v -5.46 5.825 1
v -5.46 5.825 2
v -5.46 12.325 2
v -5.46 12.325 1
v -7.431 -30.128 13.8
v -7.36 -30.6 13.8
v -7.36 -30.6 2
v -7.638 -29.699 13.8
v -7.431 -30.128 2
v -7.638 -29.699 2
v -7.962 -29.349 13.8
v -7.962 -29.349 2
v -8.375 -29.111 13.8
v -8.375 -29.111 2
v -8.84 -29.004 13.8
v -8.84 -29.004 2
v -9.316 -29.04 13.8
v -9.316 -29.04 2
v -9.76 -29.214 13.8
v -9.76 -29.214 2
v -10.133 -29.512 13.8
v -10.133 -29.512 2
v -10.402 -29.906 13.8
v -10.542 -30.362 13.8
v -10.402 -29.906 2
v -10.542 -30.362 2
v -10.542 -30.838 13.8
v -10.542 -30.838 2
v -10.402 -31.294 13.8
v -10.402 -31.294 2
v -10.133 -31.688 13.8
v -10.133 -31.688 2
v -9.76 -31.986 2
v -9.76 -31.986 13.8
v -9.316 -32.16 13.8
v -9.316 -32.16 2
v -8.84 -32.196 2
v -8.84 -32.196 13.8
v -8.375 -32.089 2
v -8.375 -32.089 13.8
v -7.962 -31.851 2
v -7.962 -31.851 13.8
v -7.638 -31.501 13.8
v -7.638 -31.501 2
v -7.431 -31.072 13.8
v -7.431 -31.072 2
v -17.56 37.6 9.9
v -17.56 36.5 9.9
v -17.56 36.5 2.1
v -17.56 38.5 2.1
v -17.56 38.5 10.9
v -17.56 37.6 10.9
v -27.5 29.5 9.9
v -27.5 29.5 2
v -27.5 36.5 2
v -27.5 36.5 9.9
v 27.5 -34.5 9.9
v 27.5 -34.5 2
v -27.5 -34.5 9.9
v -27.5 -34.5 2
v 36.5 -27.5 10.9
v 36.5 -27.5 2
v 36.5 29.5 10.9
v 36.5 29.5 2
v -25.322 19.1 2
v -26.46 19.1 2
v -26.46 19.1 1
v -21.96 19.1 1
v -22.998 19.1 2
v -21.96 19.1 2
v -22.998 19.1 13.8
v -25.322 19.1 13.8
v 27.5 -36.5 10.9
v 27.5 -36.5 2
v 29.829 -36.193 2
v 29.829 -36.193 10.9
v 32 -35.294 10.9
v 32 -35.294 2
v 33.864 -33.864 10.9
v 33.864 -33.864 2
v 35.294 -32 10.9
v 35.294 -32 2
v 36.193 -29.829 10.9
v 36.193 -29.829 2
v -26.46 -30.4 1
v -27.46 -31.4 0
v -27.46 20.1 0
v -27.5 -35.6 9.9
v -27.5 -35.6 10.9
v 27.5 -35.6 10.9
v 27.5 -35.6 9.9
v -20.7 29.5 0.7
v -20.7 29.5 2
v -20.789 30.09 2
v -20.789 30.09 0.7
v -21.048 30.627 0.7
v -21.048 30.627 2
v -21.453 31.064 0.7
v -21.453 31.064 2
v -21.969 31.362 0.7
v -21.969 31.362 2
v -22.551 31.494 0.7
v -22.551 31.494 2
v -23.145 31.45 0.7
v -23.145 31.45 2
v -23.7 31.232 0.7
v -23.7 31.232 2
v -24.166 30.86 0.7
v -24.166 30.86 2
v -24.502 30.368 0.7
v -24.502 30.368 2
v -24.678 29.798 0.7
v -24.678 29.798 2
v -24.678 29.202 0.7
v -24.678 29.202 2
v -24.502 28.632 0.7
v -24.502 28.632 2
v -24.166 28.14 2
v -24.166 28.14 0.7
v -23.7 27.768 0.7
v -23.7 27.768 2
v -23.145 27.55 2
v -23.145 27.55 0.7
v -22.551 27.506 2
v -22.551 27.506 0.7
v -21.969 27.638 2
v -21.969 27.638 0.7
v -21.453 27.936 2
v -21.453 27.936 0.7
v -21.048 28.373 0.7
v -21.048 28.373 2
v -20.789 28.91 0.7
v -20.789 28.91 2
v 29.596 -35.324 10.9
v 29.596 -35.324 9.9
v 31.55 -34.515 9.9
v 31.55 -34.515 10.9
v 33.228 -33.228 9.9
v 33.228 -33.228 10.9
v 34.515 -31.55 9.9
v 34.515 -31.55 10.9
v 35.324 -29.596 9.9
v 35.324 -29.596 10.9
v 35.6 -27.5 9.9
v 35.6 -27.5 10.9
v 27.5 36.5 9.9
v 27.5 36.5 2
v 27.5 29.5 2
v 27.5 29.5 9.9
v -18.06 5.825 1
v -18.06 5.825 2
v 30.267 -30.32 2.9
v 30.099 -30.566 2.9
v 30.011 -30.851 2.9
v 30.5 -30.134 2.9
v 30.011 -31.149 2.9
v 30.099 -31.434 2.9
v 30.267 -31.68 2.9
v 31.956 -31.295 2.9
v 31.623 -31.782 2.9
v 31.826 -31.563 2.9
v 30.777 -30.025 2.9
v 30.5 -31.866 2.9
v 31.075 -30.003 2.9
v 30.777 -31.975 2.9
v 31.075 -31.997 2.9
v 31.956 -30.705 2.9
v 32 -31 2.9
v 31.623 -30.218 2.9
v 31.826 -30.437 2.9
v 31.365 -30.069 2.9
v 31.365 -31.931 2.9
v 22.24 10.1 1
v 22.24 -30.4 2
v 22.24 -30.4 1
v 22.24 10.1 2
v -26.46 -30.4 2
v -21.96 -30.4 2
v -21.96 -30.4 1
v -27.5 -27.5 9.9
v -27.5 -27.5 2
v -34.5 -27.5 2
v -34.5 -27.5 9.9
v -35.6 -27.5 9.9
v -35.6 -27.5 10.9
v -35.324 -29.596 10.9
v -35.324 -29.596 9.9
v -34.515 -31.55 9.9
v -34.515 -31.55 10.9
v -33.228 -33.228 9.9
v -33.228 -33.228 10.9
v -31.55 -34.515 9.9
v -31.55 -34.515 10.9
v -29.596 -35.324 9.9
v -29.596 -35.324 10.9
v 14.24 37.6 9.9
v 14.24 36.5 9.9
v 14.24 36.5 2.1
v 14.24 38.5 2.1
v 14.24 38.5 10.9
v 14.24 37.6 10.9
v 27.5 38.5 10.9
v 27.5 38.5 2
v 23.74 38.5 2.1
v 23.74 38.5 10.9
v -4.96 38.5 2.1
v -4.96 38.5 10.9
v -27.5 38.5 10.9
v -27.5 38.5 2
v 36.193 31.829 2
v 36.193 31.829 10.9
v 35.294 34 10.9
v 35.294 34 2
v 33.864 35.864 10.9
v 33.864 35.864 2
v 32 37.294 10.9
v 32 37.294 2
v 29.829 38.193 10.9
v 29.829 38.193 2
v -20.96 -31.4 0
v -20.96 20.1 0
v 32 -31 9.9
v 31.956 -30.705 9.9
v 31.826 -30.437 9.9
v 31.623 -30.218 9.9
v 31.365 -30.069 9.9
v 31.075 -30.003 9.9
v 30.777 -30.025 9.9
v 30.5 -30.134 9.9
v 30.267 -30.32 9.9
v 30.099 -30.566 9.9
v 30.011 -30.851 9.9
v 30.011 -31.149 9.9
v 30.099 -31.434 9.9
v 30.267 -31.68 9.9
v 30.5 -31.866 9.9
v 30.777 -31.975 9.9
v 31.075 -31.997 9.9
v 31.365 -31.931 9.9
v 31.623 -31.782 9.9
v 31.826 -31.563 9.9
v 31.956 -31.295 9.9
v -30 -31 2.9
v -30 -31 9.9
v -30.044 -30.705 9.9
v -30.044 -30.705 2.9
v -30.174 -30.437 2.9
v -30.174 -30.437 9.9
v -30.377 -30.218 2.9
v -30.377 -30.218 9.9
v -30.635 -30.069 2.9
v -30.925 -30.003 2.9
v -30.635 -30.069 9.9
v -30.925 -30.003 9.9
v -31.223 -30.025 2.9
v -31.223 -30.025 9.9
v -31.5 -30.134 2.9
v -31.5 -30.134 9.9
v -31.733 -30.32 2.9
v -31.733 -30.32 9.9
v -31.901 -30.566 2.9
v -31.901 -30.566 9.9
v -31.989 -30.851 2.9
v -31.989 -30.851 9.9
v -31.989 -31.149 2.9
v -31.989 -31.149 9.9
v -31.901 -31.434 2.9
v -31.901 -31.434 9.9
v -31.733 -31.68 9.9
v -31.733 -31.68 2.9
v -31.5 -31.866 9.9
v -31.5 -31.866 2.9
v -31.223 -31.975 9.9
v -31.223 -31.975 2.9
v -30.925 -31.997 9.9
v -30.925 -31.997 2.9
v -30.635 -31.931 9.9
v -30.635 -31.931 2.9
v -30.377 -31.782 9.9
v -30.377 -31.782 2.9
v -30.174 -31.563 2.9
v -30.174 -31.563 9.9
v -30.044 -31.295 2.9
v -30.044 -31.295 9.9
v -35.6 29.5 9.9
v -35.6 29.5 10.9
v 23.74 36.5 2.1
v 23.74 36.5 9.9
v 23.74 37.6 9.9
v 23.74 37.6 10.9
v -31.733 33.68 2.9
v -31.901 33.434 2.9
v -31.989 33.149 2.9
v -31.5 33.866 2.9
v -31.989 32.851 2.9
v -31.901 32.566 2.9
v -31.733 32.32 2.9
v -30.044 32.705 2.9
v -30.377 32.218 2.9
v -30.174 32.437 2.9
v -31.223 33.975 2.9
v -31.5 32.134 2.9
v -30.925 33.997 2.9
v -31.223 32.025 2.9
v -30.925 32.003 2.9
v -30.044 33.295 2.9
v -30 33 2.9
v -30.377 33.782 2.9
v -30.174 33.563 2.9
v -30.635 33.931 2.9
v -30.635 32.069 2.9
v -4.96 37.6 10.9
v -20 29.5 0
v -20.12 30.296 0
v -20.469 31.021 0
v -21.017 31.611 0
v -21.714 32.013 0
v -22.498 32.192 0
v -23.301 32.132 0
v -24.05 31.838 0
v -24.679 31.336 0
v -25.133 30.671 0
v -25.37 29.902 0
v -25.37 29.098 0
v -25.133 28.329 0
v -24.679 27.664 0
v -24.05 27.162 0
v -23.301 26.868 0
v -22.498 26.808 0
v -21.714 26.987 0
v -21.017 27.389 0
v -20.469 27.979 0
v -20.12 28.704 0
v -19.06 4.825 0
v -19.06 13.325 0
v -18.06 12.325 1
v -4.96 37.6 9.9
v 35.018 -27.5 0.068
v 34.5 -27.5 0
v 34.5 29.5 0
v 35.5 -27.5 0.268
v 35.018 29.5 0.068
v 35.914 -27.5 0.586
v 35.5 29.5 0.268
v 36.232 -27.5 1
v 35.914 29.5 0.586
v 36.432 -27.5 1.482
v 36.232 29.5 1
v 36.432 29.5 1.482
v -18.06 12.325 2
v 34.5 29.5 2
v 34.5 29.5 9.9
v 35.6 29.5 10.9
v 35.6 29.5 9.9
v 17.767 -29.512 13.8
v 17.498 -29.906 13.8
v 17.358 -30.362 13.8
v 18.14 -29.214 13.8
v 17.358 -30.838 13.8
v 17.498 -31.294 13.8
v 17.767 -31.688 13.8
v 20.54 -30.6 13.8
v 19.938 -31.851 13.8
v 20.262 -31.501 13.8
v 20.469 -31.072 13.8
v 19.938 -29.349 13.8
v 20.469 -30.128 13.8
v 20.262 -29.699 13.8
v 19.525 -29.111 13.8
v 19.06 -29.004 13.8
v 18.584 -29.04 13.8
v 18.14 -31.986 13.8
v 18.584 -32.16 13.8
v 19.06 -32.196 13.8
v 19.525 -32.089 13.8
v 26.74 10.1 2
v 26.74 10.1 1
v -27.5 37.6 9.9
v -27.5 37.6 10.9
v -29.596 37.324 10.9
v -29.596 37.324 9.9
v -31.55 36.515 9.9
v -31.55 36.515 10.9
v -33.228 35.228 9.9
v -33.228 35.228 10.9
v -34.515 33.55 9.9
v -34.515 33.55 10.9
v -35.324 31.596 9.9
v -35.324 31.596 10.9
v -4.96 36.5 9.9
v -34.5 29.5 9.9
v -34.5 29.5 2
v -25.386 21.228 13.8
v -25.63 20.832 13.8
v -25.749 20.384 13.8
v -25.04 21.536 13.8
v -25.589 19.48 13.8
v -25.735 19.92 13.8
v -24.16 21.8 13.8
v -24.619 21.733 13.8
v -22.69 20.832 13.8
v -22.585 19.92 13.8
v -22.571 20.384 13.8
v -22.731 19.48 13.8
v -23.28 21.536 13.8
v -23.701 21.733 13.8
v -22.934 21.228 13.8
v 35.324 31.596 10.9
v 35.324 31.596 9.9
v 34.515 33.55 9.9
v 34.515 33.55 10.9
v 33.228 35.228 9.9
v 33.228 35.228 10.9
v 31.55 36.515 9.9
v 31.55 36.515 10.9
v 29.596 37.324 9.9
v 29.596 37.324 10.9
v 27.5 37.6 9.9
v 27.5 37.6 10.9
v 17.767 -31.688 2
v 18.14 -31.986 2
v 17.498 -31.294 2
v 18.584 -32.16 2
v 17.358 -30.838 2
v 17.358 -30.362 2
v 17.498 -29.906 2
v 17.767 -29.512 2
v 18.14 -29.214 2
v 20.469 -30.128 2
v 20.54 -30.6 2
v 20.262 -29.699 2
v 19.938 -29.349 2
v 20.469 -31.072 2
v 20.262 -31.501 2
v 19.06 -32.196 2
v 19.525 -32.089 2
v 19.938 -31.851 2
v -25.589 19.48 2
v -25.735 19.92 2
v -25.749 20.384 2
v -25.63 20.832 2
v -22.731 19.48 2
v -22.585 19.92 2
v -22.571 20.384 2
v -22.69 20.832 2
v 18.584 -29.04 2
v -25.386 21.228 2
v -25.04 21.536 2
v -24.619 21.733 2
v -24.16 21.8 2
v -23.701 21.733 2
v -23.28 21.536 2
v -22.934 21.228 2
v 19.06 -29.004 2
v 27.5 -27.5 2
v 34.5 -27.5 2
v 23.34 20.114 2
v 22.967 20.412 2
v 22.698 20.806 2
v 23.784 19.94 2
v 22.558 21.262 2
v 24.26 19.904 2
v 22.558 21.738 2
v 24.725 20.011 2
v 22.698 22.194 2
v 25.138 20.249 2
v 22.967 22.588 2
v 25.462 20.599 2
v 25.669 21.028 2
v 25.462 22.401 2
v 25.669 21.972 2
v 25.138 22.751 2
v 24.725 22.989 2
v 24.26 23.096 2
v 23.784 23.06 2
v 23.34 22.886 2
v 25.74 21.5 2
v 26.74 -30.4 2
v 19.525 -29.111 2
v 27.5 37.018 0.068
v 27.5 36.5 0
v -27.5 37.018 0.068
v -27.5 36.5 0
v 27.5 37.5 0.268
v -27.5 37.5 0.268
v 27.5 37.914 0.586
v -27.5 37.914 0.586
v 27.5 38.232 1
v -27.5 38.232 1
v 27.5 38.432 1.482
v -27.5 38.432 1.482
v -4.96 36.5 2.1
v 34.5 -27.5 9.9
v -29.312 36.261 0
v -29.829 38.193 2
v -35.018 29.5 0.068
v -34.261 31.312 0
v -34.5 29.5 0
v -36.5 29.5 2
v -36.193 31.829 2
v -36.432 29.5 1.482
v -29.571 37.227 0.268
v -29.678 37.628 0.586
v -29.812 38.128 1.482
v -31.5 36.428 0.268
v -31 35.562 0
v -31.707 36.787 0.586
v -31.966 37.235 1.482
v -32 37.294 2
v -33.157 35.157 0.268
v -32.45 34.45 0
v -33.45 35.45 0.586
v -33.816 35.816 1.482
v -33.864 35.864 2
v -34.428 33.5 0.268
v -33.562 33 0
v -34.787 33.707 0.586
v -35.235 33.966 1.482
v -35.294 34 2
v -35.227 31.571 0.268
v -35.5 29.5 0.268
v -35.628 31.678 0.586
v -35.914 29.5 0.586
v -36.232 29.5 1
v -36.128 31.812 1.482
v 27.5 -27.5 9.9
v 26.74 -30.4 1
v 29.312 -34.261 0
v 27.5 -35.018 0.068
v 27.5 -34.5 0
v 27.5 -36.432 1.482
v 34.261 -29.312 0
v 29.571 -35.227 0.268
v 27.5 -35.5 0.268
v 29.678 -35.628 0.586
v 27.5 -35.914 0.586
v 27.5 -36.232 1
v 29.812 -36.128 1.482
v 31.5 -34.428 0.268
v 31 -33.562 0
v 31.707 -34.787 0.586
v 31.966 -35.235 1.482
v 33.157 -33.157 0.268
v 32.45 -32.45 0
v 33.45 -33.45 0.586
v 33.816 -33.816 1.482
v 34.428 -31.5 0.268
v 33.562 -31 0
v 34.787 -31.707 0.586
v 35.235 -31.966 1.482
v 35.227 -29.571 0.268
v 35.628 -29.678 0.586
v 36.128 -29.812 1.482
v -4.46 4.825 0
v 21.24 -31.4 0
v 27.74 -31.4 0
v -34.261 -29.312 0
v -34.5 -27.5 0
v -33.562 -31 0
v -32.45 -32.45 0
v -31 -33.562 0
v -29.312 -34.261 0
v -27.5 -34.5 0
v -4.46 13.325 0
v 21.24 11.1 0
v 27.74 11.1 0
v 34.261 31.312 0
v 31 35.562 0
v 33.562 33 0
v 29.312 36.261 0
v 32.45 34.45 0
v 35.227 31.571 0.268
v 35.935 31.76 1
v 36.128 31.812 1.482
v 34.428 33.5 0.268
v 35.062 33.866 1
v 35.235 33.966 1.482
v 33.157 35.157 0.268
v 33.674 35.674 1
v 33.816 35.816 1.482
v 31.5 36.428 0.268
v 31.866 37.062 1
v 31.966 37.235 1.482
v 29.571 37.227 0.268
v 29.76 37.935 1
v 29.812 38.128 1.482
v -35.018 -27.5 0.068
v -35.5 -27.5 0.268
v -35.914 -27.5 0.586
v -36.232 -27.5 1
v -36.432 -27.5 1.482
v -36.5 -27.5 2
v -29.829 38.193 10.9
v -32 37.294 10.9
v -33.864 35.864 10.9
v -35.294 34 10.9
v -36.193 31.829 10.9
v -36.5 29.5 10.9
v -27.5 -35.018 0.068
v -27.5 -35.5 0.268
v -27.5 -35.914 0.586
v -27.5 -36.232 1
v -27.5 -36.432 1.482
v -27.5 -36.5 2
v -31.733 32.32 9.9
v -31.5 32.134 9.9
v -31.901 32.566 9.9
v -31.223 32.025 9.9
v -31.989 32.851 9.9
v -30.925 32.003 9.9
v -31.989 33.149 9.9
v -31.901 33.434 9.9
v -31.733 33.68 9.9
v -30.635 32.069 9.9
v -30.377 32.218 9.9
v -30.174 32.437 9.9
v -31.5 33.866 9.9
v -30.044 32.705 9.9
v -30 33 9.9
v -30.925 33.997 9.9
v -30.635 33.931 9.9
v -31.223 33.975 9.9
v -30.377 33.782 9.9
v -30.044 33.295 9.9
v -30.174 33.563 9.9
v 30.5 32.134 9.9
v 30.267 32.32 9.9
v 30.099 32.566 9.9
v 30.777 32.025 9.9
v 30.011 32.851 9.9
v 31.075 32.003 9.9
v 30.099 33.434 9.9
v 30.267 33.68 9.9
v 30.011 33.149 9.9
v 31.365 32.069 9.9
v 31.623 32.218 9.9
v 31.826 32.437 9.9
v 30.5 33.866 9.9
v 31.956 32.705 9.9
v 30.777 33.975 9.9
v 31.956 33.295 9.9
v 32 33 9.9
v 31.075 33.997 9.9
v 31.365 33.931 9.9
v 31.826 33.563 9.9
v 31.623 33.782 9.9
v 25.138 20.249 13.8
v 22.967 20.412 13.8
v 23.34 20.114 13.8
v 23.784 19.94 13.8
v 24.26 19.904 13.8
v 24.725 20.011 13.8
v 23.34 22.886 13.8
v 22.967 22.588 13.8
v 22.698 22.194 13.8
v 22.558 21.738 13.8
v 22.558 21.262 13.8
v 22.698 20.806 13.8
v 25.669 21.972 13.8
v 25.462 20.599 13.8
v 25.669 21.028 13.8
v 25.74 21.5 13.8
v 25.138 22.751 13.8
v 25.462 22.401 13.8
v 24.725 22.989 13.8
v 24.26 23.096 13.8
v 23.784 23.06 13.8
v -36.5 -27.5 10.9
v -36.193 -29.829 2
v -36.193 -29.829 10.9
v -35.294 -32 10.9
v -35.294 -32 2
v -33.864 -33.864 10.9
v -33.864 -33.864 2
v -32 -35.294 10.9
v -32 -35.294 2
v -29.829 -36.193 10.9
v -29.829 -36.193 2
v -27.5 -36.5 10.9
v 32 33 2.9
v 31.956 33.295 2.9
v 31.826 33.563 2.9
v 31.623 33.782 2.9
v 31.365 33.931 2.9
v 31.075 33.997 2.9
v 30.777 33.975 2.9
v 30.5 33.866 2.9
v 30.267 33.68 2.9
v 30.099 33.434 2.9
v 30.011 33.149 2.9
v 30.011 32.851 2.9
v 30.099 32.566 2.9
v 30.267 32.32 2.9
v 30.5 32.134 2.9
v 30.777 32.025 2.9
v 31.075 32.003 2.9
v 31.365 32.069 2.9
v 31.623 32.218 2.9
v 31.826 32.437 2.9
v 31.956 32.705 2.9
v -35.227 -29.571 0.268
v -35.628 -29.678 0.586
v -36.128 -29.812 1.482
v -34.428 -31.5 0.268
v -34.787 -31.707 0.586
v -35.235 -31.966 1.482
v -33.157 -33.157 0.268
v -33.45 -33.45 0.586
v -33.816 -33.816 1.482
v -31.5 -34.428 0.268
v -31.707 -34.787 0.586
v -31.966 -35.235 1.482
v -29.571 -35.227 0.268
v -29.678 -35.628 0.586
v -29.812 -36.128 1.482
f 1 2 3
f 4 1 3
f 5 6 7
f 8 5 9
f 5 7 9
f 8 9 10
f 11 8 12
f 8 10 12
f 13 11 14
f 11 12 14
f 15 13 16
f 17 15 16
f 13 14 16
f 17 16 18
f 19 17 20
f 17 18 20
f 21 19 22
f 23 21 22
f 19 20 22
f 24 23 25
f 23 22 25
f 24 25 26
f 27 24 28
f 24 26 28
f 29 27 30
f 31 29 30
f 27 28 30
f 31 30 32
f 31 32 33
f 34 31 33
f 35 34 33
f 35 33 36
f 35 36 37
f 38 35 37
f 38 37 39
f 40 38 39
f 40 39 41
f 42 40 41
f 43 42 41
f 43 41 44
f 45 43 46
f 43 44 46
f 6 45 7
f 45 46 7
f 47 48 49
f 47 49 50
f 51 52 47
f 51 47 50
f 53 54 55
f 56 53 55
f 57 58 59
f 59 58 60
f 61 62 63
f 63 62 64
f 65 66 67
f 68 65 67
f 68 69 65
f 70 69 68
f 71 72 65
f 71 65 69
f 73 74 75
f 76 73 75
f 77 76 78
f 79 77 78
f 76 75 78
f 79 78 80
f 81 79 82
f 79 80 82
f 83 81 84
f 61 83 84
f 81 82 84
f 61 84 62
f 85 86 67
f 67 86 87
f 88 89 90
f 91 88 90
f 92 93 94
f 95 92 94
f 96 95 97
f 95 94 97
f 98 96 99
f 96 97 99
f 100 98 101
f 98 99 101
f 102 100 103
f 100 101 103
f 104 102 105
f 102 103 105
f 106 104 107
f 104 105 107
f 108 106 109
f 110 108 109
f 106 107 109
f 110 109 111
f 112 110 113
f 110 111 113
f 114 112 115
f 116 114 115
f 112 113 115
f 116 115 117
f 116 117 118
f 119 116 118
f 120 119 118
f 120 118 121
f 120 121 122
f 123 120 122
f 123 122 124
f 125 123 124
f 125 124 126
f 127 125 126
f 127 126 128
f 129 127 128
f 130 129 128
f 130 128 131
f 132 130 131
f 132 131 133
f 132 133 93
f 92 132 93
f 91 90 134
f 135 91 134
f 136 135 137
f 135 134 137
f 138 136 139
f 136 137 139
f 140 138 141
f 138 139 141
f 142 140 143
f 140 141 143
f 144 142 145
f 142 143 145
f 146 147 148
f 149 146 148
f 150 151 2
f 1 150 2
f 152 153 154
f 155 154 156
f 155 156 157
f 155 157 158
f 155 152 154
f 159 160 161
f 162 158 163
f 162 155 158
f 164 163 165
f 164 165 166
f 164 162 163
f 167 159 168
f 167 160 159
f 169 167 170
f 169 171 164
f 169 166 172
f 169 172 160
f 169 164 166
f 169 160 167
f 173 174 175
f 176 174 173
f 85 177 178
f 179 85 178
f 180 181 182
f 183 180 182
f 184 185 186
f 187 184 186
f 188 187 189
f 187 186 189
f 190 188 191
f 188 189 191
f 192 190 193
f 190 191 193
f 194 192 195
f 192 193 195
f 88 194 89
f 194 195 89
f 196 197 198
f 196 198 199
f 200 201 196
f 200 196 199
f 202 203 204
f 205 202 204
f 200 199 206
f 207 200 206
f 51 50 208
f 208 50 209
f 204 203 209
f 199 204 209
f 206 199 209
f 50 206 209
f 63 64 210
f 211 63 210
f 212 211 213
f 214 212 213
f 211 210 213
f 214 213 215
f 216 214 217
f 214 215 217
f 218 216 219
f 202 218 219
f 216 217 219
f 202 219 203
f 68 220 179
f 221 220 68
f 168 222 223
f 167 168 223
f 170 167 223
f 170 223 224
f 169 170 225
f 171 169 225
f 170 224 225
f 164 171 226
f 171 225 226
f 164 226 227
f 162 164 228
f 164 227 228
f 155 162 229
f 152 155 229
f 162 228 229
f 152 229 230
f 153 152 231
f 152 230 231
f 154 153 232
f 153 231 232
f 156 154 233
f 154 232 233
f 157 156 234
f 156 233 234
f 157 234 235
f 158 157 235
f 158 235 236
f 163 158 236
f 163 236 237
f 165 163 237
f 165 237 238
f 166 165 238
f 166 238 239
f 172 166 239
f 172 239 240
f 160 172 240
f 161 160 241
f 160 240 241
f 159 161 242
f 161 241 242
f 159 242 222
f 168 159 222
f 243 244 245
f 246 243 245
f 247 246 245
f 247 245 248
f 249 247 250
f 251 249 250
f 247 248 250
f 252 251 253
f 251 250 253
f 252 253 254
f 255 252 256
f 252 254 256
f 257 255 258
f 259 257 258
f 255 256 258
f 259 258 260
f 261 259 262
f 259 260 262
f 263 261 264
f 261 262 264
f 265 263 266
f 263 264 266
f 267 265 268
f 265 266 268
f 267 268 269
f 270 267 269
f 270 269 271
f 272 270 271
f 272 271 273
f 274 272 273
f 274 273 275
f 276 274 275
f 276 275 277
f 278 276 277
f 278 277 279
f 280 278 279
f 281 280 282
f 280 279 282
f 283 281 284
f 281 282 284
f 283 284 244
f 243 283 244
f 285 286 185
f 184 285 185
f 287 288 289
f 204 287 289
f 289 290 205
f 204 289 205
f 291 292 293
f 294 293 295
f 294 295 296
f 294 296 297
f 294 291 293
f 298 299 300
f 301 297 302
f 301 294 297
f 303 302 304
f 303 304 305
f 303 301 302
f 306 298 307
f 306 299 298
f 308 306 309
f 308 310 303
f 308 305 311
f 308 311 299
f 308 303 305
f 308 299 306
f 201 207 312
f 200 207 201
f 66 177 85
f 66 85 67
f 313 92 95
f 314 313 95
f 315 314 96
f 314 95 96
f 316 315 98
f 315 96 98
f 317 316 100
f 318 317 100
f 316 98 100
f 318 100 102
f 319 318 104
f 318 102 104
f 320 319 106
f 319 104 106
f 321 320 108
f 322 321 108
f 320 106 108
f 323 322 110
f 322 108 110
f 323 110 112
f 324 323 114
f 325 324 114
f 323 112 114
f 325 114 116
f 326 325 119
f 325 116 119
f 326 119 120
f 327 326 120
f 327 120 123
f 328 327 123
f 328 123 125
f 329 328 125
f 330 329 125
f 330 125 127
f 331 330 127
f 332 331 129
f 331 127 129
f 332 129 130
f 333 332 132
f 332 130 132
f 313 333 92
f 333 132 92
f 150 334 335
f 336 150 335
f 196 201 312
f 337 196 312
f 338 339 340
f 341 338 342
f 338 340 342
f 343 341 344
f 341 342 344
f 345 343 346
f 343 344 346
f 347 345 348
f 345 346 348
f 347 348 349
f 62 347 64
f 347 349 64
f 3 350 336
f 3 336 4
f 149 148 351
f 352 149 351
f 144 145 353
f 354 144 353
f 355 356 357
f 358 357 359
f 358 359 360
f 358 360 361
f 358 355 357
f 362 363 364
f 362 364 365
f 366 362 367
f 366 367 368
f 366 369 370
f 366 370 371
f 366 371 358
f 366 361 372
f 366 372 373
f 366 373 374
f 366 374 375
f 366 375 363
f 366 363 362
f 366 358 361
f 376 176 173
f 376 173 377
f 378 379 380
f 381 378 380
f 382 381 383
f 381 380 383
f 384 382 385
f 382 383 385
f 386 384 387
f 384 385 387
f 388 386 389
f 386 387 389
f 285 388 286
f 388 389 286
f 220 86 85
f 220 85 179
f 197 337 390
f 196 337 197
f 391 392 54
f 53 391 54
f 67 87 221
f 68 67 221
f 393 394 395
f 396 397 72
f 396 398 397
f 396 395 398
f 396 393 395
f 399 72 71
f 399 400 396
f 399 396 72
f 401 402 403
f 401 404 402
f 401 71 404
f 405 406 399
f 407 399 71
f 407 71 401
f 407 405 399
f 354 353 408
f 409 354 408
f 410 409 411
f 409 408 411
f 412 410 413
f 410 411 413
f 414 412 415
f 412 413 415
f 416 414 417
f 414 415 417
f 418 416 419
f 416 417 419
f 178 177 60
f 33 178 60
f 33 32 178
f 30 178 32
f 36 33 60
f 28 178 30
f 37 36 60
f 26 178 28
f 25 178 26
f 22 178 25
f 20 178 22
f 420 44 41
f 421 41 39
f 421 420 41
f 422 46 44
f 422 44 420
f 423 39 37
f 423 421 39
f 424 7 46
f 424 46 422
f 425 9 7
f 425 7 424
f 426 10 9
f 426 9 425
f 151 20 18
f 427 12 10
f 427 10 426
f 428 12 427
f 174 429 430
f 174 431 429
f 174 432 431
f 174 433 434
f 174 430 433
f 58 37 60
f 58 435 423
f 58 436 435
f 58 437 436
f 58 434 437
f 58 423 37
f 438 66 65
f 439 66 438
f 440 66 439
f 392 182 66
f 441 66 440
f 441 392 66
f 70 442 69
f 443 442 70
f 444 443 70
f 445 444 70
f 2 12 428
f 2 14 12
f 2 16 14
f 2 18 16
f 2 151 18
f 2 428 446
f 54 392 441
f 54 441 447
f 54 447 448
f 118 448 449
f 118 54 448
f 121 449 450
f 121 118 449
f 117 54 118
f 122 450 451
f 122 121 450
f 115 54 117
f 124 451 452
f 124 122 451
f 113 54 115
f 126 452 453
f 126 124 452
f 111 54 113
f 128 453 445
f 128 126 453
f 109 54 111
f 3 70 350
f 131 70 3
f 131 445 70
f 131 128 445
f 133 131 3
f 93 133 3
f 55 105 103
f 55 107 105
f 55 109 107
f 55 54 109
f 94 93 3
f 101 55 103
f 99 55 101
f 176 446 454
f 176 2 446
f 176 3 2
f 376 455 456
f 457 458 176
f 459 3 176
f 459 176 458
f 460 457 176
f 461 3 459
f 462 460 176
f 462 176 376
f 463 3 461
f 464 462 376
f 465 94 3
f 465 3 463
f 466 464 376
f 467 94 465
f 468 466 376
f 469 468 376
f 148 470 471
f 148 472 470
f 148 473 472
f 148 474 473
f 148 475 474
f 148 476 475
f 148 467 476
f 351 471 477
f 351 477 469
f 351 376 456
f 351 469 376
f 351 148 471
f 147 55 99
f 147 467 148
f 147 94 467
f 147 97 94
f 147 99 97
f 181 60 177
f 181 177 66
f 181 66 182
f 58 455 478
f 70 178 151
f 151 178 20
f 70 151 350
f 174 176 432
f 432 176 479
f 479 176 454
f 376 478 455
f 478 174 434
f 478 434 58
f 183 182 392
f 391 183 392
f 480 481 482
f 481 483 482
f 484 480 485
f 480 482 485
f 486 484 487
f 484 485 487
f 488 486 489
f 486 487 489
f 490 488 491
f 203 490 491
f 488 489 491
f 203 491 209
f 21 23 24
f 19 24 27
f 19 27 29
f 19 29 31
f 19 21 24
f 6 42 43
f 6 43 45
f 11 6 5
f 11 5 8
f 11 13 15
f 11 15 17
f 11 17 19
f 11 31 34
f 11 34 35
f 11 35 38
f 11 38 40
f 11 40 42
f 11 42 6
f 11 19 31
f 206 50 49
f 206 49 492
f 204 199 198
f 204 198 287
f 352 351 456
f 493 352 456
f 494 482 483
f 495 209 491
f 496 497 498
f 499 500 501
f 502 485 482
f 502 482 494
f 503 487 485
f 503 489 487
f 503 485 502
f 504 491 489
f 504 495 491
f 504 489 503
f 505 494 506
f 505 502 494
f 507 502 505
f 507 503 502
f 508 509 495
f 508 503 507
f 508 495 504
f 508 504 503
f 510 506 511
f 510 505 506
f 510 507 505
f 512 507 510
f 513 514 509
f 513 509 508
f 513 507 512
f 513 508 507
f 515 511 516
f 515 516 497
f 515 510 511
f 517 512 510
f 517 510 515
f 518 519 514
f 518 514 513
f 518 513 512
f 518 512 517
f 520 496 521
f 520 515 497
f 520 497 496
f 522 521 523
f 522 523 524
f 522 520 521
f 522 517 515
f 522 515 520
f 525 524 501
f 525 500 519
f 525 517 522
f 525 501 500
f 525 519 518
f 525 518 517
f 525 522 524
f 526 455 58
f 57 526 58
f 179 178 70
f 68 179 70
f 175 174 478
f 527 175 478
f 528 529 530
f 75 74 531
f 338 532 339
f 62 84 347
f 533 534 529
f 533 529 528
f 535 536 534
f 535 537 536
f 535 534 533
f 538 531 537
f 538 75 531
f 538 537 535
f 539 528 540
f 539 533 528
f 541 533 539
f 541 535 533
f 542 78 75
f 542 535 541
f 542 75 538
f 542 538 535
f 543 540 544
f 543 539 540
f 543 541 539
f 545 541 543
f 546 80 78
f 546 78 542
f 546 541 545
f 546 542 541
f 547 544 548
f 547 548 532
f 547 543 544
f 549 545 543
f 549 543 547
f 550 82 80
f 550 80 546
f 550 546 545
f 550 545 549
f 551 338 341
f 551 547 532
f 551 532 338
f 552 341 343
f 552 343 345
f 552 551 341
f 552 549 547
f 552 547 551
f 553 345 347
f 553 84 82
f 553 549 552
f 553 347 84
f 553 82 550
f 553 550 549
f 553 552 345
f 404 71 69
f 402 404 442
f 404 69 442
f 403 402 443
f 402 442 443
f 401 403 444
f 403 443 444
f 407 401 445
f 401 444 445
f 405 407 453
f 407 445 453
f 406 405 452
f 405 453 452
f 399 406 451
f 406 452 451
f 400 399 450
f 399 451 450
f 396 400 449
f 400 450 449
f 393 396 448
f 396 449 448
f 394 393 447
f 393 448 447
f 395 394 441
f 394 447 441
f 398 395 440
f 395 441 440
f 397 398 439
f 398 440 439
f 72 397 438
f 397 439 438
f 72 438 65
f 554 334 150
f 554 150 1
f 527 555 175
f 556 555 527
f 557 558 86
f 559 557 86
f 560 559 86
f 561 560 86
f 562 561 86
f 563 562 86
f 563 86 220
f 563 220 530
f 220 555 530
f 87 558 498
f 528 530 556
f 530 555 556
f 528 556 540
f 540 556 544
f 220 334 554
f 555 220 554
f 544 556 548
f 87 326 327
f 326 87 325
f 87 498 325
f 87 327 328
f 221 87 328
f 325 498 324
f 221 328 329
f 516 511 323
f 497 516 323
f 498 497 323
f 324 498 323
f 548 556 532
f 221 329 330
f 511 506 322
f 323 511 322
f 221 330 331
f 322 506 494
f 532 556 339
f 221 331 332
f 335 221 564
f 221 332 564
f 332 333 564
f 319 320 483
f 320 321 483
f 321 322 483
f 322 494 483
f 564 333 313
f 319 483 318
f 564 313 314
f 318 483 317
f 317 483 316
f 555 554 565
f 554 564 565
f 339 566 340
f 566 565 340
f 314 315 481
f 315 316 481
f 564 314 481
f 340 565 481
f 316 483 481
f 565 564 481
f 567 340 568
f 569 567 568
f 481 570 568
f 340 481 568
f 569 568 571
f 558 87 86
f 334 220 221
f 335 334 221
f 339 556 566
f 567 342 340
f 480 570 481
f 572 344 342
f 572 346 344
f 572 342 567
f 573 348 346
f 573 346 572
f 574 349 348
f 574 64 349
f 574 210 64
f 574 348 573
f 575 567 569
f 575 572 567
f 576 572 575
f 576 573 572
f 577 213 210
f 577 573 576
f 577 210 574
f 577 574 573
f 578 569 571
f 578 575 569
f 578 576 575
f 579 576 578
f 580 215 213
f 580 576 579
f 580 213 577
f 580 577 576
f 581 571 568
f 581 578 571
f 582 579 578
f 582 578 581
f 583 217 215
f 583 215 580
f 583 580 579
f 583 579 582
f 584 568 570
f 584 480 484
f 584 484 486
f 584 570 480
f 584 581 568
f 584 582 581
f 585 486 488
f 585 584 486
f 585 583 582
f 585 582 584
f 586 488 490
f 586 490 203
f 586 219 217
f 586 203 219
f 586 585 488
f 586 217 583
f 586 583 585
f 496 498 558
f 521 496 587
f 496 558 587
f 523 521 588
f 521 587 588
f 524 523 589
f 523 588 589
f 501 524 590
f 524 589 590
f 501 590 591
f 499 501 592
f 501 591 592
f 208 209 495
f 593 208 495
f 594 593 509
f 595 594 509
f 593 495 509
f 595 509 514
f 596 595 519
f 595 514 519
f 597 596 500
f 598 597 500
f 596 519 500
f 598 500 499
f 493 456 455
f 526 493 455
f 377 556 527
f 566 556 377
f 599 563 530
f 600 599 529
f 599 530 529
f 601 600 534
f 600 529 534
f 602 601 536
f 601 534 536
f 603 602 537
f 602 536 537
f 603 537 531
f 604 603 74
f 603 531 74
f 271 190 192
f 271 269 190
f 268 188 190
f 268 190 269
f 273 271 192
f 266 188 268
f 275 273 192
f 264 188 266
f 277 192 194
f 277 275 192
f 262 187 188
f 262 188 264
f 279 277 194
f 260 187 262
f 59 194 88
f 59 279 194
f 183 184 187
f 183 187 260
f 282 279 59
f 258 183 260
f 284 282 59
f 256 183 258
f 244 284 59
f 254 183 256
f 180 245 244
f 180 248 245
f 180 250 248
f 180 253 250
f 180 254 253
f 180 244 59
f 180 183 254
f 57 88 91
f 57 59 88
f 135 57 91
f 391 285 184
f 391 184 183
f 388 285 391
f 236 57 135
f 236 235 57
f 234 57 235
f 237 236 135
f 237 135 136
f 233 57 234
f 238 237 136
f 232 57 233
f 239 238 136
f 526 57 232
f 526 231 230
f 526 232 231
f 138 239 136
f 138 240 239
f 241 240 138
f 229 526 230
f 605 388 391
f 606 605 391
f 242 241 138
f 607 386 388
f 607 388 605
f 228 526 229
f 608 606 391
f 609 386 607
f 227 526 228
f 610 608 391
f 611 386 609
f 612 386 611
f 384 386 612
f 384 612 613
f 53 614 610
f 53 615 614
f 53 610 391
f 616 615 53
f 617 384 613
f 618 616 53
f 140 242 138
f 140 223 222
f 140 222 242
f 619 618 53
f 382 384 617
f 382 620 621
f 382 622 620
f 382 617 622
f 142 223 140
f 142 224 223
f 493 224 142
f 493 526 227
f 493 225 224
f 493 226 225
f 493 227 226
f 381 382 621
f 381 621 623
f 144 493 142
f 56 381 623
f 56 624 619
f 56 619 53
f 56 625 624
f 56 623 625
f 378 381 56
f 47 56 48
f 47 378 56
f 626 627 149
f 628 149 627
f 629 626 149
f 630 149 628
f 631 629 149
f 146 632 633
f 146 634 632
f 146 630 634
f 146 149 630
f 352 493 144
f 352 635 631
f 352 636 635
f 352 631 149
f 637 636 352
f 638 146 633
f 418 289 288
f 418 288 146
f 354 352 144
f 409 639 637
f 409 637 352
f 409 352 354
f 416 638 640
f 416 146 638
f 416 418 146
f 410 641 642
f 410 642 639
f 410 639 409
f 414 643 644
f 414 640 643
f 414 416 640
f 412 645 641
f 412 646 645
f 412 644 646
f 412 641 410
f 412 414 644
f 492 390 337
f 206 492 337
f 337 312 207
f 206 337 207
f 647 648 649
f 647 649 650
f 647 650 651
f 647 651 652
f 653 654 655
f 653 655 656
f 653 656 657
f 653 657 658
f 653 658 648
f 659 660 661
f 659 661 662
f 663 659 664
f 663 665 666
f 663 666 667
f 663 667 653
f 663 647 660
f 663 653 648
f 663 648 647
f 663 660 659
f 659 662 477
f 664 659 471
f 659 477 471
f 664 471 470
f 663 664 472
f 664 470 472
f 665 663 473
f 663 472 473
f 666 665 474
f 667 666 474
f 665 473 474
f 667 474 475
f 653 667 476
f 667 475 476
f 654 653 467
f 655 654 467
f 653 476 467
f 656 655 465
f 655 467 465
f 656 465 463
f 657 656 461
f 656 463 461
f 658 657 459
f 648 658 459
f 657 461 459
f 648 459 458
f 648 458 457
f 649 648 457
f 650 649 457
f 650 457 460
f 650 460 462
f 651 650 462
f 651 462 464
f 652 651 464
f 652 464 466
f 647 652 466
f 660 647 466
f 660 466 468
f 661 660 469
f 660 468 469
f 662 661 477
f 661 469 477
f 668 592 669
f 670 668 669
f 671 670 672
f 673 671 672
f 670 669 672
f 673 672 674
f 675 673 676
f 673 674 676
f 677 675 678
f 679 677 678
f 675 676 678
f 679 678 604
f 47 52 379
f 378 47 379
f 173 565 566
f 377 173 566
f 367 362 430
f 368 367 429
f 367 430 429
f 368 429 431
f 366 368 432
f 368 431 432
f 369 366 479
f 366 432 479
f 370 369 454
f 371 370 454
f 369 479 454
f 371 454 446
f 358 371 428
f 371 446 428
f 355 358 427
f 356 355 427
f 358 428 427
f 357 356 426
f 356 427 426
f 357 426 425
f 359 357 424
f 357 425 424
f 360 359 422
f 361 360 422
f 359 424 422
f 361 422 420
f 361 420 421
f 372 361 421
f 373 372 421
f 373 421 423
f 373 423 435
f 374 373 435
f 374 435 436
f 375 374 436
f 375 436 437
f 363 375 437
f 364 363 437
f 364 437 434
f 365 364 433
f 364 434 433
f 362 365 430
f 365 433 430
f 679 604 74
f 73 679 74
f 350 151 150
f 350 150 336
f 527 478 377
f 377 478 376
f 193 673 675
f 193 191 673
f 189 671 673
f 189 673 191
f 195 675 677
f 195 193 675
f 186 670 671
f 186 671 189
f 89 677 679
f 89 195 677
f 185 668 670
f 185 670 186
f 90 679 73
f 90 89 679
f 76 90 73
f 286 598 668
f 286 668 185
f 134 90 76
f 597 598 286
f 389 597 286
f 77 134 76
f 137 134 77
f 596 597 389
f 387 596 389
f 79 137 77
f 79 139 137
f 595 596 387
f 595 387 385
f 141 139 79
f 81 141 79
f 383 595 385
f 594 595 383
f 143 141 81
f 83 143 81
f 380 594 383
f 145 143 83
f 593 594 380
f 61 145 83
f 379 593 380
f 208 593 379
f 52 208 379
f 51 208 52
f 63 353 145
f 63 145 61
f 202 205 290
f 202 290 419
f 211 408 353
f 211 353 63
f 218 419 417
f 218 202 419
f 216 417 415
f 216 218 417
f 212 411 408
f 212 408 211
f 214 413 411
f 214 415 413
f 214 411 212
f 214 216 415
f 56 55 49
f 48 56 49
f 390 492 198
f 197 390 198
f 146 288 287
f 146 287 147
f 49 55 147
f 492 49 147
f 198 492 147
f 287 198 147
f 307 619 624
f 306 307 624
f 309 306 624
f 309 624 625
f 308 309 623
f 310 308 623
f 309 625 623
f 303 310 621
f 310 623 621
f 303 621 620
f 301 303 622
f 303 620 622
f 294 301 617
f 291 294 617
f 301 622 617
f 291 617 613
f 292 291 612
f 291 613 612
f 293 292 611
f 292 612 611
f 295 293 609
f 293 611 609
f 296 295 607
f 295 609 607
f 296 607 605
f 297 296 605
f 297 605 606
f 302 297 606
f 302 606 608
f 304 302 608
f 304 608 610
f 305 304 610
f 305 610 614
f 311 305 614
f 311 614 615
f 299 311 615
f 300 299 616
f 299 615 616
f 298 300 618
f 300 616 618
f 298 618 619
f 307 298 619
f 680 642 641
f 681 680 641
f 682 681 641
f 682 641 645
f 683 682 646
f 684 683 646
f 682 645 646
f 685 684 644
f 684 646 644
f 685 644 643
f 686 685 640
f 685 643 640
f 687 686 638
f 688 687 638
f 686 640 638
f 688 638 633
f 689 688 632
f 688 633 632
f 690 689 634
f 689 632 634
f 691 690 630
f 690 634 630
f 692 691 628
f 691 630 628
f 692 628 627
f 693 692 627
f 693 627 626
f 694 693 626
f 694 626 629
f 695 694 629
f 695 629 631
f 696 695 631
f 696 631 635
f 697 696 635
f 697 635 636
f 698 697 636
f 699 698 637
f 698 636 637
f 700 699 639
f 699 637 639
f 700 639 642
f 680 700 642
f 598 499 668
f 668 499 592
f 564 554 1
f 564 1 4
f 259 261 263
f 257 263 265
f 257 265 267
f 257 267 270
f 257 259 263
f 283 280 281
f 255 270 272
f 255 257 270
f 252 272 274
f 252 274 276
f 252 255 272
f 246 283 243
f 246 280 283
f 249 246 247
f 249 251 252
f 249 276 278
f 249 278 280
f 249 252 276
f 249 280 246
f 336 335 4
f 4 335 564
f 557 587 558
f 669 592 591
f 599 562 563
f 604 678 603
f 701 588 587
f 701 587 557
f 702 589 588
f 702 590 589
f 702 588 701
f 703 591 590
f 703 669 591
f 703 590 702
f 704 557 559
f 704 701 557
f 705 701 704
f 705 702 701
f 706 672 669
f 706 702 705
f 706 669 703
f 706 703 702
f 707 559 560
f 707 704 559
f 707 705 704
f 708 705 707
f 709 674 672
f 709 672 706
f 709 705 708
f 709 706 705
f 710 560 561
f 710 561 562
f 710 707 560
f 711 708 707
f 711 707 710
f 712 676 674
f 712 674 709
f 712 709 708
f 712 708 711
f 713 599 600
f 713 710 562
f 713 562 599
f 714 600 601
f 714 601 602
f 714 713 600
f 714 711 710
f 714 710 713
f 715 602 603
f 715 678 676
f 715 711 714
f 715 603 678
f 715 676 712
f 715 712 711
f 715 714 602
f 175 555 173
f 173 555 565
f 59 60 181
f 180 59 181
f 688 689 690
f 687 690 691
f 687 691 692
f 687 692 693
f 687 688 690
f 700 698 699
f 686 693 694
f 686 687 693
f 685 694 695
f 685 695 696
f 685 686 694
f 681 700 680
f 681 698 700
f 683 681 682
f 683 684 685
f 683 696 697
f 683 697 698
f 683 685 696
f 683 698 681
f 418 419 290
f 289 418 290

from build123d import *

# Parameters (mm, degrees)
F1_DEPTH  = 2
F2_R      = 1.6
F3_DEPTH  = 11.8
F5_DEPTH  = 8.9
F7_DEPTH  = 1
F8_W      = 12.6
F8_H      = 2
F8_W_2    = 9.5
F9_DEPTH  = 8.8
F10_W     = 4.5
F10_H     = 49.5
F10_H_2   = 40.5
F11_DEPTH = 10
F12_DEPTH = 15
F14_DEPTH = 7.9
F15_R     = 1
F16_DEPTH = 7
F17_W     = 12.6
F17_H     = 6.5
F18_DEPTH = 4
F19_SIZE  = 1
F20_R     = 2
F21_DEPTH = 4
F22_R     = 2
F23_SIZE  = 0.7


with BuildPart() as f1:
    # F0 (on Top) → F1 (new body)
    with BuildSketch(Plane.XY):
        with BuildLine():
            Line((27.5, 38.5), (-27.5, 38.5))
            ThreePointArc((-27.5, 38.5), (-33.863961, 35.863961), (-36.5, 29.5))
            Line((-36.5, 29.5), (-36.5, -27.5))
            ThreePointArc((-36.5, -27.5), (-33.863961, -33.863961), (-27.5, -36.5))
            Line((-27.5, -36.5), (27.5, -36.5))
            ThreePointArc((27.5, -36.5), (33.863961, -33.863961), (36.5, -27.5))
            Line((36.5, -27.5), (36.5, 29.5))
            ThreePointArc((36.5, 29.5), (33.863961, 35.863961), (27.5, 38.5))
        make_face()
    extrude(amount=F1_DEPTH)

    # F2 (on face) → F3 (join)
    with BuildSketch(Plane.XY.offset(2)):
        with Locations((-24.16, 20.2)):
            Circle(F2_R)
        with Locations((24.14, 21.5)):
            Circle(F2_R)
        with Locations((18.94, -30.6)):
            Circle(F2_R)
        with Locations((-8.96, -30.6)):
            Circle(F2_R)
    extrude(amount=F3_DEPTH)

    # F4 (on face) → F5 (join)
    with BuildSketch(Plane.XY.offset(2)):
        with BuildLine():
            Line((27.5, 38.5), (-27.5, 38.5))
            ThreePointArc((-27.5, 38.5), (-33.863961, 35.863961), (-36.5, 29.5))
            Line((-36.5, 29.5), (-36.5, -27.5))
            ThreePointArc((-36.5, -27.5), (-33.863961, -33.863961), (-27.5, -36.5))
            Line((-27.5, -36.5), (27.5, -36.5))
            ThreePointArc((27.5, -36.5), (33.863961, -33.863961), (36.5, -27.5))
            Line((36.5, -27.5), (36.5, 29.5))
            ThreePointArc((36.5, 29.5), (33.863961, 35.863961), (27.5, 38.5))
        make_face()
        with BuildLine():
            ThreePointArc((-34.5, 29.5), (-32.449747, 34.449747), (-27.5, 36.5))
            Line((-27.5, 36.5), (27.5, 36.5))
            ThreePointArc((27.5, 36.5), (32.449747, 34.449747), (34.5, 29.5))
            Line((34.5, 29.5), (34.5, -27.5))
            ThreePointArc((34.5, -27.5), (32.449747, -32.449747), (27.5, -34.5))
            Line((27.5, -34.5), (-27.5, -34.5))
            ThreePointArc((-27.5, -34.5), (-32.449747, -32.449747), (-34.5, -27.5))
            Line((-34.5, -27.5), (-34.5, 29.5))
        make_face(mode=Mode.SUBTRACT)
    extrude(amount=F5_DEPTH)

    # F6 (on face) → F7 (cut)
    with BuildSketch(Plane.XY.offset(10.9)):
        with BuildLine():
            Line((27.5, 37.6), (-27.5, 37.6))
            ThreePointArc((-27.5, 37.6), (-33.227565, 35.227565), (-35.6, 29.5))
            Line((-35.6, 29.5), (-35.6, -27.5))
            ThreePointArc((-35.6, -27.5), (-33.227565, -33.227565), (-27.5, -35.6))
            Line((-27.5, -35.6), (27.5, -35.6))
            ThreePointArc((27.5, -35.6), (33.227565, -33.227565), (35.6, -27.5))
            Line((35.6, -27.5), (35.6, 29.5))
            ThreePointArc((35.6, 29.5), (33.227565, 35.227565), (27.5, 37.6))
        make_face()
        with BuildLine():
            ThreePointArc((-34.5, 29.5), (-32.449747, 34.449747), (-27.5, 36.5))
            Line((-27.5, 36.5), (27.5, 36.5))
            ThreePointArc((27.5, 36.5), (32.449747, 34.449747), (34.5, 29.5))
            Line((34.5, 29.5), (34.5, -27.5))
            ThreePointArc((34.5, -27.5), (32.449747, -32.449747), (27.5, -34.5))
            Line((27.5, -34.5), (-27.5, -34.5))
            ThreePointArc((-27.5, -34.5), (-32.449747, -32.449747), (-34.5, -27.5))
            Line((-34.5, -27.5), (-34.5, 29.5))
        make_face(mode=Mode.SUBTRACT)
    extrude(amount=-F7_DEPTH, mode=Mode.SUBTRACT)

    # F8 (on face) → F9 (cut)
    with BuildSketch(Plane.XY.offset(10.9)):
        with Locations((-11.26, 37.5)):
            Rectangle(F8_W, F8_H)
        with Locations((18.99, 37.5)):
            Rectangle(F8_W_2, F8_H)
    extrude(amount=-F9_DEPTH, mode=Mode.SUBTRACT)

    # F10 (on face) → F11 (cut)
    with BuildSketch(Plane.XY.offset(2)):
        with Locations((-24.21, -5.65)):
            Rectangle(F10_W, F10_H)
        with Locations((24.49, -10.15)):
            Rectangle(F10_W, F10_H_2)
    extrude(amount=-F11_DEPTH, mode=Mode.SUBTRACT)

    # F10 (on face) → F12 (cut)
    with BuildSketch(Plane.XY.offset(2)):
        with Locations((-24.21, -5.65)):
            Rectangle(F10_W, F10_H)
        with Locations((24.49, -10.15)):
            Rectangle(F10_W, F10_H_2)
    extrude(amount=F12_DEPTH, mode=Mode.SUBTRACT)

    # F13 (on face) → F14 (join)
    with BuildSketch(Plane.XY.offset(2)):
        with BuildLine():
            Line((-27.5, 29.5), (-27.5, 36.5))
            ThreePointArc((-27.5, 36.5), (-32.449747, 34.449747), (-34.5, 29.5))
            Line((-34.5, 29.5), (-27.5, 29.5))
        make_face()
        with BuildLine():
            Line((27.5, 29.5), (34.5, 29.5))
            ThreePointArc((34.5, 29.5), (32.449747, 34.449747), (27.5, 36.5))
            Line((27.5, 36.5), (27.5, 29.5))
        make_face()
        with BuildLine():
            Line((27.5, -27.5), (27.5, -34.5))
            ThreePointArc((27.5, -34.5), (32.449747, -32.449747), (34.5, -27.5))
            Line((34.5, -27.5), (27.5, -27.5))
        make_face()
        with BuildLine():
            Line((-27.5, -27.5), (-34.5, -27.5))
            ThreePointArc((-34.5, -27.5), (-32.449747, -32.449747), (-27.5, -34.5))
            Line((-27.5, -34.5), (-27.5, -27.5))
        make_face()
    extrude(amount=F14_DEPTH)

    # F15 (on face) → F16 (cut)
    with BuildSketch(Plane.XY.offset(9.9)):
        with Locations((-31, 33)):
            Circle(F15_R)
        with Locations((31, 33)):
            Circle(F15_R)
        with Locations((31, -31)):
            Circle(F15_R)
        with Locations((-31, -31)):
            Circle(F15_R)
    extrude(amount=-F16_DEPTH, mode=Mode.SUBTRACT)

    # F17 (on face) → F18 (cut)
    with BuildSketch(Plane.XY.offset(2)):
        with Locations((-11.76, 9.075)):
            Rectangle(F17_W, F17_H)
    extrude(amount=-F18_DEPTH, mode=Mode.SUBTRACT)

    # F19
    f19_edges = [f1.edges().sort_by_distance(p)[0] for p in [
        (-26.46, -5.65, 0),
        (-24.21, 19.1, 0),
        (-21.96, -5.65, 0),
        (-24.21, -30.4, 0),
        (-11.76, 5.825, 0),
        (-18.06, 9.075, 0),
        (-11.76, 12.325, 0),
        (-5.46, 9.075, 0),
        (22.24, -10.15, 0),
        (26.74, -10.15, 0),
        (24.49, 10.1, 0),
        (24.49, -30.4, 0),
    ]]
    chamfer(f19_edges, length=F19_SIZE)

    # F20 (on face) → F21 (cut)
    with BuildSketch(Plane.XY.offset(2)):
        with Locations((-22.7, 29.5)):
            Circle(F20_R)
    extrude(amount=-F21_DEPTH, mode=Mode.SUBTRACT)

    # F22
    f22_edges = [f1.edges().sort_by_distance(p)[0] for p in [
        (0, 38.5, 0),
    ]]
    fillet(f22_edges, radius=F22_R)

    # F23
    f23_edges = [f1.edges().sort_by_distance(p)[0] for p in [
        (-24.7, 29.5, 0),
    ]]
    chamfer(f23_edges, length=F23_SIZE)


solid = f1.part
